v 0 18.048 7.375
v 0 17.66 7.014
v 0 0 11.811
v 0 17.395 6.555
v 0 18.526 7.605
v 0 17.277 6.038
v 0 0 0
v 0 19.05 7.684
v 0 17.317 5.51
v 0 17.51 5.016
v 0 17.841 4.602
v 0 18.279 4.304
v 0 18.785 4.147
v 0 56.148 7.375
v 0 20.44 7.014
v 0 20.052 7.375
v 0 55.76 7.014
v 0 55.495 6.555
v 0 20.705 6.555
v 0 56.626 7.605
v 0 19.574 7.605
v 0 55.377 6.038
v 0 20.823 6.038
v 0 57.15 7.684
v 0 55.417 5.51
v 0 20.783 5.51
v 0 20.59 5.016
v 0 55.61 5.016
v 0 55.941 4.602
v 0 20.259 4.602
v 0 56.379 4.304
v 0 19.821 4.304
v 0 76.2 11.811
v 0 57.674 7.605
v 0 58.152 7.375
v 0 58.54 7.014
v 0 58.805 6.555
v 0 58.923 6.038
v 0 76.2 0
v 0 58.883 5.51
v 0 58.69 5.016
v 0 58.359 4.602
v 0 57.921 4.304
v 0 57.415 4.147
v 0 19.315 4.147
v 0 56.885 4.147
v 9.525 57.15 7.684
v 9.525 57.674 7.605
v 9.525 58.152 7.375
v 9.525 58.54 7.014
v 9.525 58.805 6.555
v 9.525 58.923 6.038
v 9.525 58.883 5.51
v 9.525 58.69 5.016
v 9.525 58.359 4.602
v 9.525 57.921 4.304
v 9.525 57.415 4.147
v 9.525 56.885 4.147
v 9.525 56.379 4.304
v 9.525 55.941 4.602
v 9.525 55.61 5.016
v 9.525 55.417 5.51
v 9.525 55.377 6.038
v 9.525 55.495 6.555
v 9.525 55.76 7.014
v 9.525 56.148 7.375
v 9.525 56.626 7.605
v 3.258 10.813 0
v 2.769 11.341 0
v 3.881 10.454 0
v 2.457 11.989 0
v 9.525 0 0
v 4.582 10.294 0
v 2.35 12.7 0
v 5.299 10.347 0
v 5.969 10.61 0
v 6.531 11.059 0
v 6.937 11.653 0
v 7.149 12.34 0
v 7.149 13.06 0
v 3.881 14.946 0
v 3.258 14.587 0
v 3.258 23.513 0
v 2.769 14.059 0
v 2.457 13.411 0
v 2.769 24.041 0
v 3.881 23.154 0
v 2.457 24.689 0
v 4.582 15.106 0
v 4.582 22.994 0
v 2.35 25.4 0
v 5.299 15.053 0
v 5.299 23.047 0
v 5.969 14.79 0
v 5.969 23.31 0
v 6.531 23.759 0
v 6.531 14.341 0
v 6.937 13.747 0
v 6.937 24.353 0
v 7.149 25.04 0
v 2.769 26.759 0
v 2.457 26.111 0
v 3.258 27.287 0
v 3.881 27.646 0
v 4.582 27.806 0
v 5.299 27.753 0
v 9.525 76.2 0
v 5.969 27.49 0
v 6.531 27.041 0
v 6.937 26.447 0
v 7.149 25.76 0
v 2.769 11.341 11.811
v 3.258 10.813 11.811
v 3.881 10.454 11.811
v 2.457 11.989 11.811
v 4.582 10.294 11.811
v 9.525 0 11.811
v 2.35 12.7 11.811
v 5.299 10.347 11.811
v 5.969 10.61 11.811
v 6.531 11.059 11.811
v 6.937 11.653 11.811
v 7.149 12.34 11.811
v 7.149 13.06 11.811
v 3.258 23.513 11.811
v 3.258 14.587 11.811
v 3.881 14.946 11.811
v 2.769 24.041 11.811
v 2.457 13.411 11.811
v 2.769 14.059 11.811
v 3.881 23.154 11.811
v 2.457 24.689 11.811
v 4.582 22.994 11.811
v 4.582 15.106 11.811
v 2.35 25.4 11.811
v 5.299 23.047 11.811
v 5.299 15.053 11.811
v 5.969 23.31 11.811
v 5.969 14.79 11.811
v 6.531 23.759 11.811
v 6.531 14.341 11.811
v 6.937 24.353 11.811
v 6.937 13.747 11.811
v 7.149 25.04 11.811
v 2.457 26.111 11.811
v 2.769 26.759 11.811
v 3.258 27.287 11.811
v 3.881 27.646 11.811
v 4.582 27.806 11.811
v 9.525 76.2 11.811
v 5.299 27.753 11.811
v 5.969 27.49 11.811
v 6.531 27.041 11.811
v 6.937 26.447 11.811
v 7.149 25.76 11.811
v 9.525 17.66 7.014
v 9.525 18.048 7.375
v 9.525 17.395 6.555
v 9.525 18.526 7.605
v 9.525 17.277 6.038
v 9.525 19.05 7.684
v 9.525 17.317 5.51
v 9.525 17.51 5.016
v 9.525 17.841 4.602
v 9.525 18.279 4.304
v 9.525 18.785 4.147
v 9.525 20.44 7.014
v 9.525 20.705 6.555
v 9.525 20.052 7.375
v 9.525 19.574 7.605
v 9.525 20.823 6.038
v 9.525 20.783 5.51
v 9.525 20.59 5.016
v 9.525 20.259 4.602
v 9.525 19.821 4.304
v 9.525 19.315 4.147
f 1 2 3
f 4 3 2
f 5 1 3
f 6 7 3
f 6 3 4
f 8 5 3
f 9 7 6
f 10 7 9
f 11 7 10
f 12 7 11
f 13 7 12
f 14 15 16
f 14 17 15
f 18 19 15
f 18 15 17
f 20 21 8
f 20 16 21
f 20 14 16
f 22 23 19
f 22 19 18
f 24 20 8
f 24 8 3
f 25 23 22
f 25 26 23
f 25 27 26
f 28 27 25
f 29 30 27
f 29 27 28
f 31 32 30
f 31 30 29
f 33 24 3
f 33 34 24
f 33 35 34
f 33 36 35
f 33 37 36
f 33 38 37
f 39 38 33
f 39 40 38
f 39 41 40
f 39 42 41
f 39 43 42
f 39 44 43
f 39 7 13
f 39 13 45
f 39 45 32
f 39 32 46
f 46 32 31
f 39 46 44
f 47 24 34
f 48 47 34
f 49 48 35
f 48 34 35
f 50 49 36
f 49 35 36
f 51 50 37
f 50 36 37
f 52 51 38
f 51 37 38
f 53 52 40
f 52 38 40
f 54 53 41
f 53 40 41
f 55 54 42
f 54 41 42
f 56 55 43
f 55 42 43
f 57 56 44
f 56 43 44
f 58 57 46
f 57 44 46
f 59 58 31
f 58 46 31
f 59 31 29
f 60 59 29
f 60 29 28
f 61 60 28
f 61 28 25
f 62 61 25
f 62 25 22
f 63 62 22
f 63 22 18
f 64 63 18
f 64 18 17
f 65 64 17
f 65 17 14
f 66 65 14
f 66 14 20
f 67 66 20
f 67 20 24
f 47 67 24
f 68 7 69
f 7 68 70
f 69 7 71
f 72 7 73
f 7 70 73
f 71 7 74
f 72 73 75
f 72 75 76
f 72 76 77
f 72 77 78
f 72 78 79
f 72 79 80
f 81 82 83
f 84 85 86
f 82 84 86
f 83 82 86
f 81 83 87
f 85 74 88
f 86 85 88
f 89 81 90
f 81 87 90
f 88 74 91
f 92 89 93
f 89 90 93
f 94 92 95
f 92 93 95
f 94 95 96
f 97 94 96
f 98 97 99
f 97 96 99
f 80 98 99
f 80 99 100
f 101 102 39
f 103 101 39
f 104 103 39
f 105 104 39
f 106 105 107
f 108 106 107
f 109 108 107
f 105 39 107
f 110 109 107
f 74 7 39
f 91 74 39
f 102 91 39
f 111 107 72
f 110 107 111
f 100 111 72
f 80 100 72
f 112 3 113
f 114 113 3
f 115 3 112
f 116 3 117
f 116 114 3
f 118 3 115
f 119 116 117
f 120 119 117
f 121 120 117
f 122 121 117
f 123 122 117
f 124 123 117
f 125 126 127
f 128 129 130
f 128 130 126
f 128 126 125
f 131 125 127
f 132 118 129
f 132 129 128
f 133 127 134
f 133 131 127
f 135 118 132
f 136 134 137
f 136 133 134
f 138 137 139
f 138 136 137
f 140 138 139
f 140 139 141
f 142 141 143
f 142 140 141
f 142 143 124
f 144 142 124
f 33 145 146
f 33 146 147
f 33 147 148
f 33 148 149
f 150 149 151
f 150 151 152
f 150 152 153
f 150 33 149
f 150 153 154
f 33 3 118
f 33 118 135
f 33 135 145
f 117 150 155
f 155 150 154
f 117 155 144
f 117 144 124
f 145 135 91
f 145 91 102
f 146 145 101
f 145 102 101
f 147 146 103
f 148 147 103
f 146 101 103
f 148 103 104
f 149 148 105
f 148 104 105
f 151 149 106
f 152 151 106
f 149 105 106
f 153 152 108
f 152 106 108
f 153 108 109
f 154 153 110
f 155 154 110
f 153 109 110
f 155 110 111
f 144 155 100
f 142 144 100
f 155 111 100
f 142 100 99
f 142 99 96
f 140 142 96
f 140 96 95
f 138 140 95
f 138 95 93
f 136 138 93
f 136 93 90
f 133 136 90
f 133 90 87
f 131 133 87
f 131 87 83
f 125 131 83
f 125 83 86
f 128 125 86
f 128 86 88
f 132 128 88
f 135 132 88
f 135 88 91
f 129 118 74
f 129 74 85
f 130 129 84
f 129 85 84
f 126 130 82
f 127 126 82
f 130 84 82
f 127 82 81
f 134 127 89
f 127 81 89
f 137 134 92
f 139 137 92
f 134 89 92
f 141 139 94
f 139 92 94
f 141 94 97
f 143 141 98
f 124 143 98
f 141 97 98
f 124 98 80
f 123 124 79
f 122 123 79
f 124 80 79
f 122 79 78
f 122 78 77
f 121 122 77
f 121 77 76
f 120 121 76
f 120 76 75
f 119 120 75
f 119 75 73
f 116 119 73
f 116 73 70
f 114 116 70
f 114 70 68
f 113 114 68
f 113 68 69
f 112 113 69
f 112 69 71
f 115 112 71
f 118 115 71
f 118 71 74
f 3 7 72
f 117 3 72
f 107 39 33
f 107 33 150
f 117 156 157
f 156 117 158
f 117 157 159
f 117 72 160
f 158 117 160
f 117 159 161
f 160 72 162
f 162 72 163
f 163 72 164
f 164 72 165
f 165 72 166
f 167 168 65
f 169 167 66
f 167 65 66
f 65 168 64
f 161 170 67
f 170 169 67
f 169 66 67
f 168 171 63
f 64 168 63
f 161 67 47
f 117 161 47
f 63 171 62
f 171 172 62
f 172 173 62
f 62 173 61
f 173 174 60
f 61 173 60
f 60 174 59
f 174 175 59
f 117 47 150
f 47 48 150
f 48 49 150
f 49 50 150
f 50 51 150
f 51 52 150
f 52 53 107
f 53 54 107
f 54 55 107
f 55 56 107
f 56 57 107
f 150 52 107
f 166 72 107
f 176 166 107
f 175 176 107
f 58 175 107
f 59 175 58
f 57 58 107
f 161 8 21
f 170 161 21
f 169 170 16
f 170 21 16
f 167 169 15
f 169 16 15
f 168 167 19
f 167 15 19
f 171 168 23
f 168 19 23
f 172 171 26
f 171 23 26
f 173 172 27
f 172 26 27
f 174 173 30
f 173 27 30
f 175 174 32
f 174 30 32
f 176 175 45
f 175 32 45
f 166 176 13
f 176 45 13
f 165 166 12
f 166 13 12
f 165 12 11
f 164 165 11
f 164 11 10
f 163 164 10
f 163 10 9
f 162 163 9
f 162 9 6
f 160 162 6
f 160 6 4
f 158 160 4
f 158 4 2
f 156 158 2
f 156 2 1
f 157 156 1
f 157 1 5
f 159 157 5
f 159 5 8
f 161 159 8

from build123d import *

# Parameters (mm, degrees)
SKETCH1_W           = 9.525
SKETCH1_H           = 76.2
BOSS_EXTRUDE1_DEPTH = 11.811
SKETCH2_R           = 1.778
CUT_EXTRUDE1_DEPTH  = 10.525
SKETCH3_R           = 2.413
CUT_EXTRUDE2_DEPTH  = 12.811


with BuildPart() as part:
    # Sketch1 → Boss-Extrude1 (new body)
    with BuildSketch(Plane.XY):
        with Locations((4.7625, 38.1)):
            Rectangle(SKETCH1_W, SKETCH1_H)
    extrude(amount=BOSS_EXTRUDE1_DEPTH)

    # Sketch2 → Cut-Extrude1 (cut, through all)
    with BuildSketch(Plane.ZY):
        with Locations((5.9055, 57.15)):
            Circle(SKETCH2_R)
        with Locations((5.9055, 19.05)):
            Circle(SKETCH2_R)
    extrude(amount=-CUT_EXTRUDE1_DEPTH, mode=Mode.SUBTRACT)

    # Sketch3 → Cut-Extrude2 (cut, through all)
    with BuildSketch(Plane(origin=(0, 0, 0), x_dir=(-1, 0, 0), z_dir=(0, 0, -1))):
        with Locations((-4.7625, 25.4)):
            Circle(SKETCH3_R)
        with Locations((-4.7625, 12.7)):
            Circle(SKETCH3_R)
    extrude(amount=-CUT_EXTRUDE2_DEPTH, mode=Mode.SUBTRACT)


solid = part.part
